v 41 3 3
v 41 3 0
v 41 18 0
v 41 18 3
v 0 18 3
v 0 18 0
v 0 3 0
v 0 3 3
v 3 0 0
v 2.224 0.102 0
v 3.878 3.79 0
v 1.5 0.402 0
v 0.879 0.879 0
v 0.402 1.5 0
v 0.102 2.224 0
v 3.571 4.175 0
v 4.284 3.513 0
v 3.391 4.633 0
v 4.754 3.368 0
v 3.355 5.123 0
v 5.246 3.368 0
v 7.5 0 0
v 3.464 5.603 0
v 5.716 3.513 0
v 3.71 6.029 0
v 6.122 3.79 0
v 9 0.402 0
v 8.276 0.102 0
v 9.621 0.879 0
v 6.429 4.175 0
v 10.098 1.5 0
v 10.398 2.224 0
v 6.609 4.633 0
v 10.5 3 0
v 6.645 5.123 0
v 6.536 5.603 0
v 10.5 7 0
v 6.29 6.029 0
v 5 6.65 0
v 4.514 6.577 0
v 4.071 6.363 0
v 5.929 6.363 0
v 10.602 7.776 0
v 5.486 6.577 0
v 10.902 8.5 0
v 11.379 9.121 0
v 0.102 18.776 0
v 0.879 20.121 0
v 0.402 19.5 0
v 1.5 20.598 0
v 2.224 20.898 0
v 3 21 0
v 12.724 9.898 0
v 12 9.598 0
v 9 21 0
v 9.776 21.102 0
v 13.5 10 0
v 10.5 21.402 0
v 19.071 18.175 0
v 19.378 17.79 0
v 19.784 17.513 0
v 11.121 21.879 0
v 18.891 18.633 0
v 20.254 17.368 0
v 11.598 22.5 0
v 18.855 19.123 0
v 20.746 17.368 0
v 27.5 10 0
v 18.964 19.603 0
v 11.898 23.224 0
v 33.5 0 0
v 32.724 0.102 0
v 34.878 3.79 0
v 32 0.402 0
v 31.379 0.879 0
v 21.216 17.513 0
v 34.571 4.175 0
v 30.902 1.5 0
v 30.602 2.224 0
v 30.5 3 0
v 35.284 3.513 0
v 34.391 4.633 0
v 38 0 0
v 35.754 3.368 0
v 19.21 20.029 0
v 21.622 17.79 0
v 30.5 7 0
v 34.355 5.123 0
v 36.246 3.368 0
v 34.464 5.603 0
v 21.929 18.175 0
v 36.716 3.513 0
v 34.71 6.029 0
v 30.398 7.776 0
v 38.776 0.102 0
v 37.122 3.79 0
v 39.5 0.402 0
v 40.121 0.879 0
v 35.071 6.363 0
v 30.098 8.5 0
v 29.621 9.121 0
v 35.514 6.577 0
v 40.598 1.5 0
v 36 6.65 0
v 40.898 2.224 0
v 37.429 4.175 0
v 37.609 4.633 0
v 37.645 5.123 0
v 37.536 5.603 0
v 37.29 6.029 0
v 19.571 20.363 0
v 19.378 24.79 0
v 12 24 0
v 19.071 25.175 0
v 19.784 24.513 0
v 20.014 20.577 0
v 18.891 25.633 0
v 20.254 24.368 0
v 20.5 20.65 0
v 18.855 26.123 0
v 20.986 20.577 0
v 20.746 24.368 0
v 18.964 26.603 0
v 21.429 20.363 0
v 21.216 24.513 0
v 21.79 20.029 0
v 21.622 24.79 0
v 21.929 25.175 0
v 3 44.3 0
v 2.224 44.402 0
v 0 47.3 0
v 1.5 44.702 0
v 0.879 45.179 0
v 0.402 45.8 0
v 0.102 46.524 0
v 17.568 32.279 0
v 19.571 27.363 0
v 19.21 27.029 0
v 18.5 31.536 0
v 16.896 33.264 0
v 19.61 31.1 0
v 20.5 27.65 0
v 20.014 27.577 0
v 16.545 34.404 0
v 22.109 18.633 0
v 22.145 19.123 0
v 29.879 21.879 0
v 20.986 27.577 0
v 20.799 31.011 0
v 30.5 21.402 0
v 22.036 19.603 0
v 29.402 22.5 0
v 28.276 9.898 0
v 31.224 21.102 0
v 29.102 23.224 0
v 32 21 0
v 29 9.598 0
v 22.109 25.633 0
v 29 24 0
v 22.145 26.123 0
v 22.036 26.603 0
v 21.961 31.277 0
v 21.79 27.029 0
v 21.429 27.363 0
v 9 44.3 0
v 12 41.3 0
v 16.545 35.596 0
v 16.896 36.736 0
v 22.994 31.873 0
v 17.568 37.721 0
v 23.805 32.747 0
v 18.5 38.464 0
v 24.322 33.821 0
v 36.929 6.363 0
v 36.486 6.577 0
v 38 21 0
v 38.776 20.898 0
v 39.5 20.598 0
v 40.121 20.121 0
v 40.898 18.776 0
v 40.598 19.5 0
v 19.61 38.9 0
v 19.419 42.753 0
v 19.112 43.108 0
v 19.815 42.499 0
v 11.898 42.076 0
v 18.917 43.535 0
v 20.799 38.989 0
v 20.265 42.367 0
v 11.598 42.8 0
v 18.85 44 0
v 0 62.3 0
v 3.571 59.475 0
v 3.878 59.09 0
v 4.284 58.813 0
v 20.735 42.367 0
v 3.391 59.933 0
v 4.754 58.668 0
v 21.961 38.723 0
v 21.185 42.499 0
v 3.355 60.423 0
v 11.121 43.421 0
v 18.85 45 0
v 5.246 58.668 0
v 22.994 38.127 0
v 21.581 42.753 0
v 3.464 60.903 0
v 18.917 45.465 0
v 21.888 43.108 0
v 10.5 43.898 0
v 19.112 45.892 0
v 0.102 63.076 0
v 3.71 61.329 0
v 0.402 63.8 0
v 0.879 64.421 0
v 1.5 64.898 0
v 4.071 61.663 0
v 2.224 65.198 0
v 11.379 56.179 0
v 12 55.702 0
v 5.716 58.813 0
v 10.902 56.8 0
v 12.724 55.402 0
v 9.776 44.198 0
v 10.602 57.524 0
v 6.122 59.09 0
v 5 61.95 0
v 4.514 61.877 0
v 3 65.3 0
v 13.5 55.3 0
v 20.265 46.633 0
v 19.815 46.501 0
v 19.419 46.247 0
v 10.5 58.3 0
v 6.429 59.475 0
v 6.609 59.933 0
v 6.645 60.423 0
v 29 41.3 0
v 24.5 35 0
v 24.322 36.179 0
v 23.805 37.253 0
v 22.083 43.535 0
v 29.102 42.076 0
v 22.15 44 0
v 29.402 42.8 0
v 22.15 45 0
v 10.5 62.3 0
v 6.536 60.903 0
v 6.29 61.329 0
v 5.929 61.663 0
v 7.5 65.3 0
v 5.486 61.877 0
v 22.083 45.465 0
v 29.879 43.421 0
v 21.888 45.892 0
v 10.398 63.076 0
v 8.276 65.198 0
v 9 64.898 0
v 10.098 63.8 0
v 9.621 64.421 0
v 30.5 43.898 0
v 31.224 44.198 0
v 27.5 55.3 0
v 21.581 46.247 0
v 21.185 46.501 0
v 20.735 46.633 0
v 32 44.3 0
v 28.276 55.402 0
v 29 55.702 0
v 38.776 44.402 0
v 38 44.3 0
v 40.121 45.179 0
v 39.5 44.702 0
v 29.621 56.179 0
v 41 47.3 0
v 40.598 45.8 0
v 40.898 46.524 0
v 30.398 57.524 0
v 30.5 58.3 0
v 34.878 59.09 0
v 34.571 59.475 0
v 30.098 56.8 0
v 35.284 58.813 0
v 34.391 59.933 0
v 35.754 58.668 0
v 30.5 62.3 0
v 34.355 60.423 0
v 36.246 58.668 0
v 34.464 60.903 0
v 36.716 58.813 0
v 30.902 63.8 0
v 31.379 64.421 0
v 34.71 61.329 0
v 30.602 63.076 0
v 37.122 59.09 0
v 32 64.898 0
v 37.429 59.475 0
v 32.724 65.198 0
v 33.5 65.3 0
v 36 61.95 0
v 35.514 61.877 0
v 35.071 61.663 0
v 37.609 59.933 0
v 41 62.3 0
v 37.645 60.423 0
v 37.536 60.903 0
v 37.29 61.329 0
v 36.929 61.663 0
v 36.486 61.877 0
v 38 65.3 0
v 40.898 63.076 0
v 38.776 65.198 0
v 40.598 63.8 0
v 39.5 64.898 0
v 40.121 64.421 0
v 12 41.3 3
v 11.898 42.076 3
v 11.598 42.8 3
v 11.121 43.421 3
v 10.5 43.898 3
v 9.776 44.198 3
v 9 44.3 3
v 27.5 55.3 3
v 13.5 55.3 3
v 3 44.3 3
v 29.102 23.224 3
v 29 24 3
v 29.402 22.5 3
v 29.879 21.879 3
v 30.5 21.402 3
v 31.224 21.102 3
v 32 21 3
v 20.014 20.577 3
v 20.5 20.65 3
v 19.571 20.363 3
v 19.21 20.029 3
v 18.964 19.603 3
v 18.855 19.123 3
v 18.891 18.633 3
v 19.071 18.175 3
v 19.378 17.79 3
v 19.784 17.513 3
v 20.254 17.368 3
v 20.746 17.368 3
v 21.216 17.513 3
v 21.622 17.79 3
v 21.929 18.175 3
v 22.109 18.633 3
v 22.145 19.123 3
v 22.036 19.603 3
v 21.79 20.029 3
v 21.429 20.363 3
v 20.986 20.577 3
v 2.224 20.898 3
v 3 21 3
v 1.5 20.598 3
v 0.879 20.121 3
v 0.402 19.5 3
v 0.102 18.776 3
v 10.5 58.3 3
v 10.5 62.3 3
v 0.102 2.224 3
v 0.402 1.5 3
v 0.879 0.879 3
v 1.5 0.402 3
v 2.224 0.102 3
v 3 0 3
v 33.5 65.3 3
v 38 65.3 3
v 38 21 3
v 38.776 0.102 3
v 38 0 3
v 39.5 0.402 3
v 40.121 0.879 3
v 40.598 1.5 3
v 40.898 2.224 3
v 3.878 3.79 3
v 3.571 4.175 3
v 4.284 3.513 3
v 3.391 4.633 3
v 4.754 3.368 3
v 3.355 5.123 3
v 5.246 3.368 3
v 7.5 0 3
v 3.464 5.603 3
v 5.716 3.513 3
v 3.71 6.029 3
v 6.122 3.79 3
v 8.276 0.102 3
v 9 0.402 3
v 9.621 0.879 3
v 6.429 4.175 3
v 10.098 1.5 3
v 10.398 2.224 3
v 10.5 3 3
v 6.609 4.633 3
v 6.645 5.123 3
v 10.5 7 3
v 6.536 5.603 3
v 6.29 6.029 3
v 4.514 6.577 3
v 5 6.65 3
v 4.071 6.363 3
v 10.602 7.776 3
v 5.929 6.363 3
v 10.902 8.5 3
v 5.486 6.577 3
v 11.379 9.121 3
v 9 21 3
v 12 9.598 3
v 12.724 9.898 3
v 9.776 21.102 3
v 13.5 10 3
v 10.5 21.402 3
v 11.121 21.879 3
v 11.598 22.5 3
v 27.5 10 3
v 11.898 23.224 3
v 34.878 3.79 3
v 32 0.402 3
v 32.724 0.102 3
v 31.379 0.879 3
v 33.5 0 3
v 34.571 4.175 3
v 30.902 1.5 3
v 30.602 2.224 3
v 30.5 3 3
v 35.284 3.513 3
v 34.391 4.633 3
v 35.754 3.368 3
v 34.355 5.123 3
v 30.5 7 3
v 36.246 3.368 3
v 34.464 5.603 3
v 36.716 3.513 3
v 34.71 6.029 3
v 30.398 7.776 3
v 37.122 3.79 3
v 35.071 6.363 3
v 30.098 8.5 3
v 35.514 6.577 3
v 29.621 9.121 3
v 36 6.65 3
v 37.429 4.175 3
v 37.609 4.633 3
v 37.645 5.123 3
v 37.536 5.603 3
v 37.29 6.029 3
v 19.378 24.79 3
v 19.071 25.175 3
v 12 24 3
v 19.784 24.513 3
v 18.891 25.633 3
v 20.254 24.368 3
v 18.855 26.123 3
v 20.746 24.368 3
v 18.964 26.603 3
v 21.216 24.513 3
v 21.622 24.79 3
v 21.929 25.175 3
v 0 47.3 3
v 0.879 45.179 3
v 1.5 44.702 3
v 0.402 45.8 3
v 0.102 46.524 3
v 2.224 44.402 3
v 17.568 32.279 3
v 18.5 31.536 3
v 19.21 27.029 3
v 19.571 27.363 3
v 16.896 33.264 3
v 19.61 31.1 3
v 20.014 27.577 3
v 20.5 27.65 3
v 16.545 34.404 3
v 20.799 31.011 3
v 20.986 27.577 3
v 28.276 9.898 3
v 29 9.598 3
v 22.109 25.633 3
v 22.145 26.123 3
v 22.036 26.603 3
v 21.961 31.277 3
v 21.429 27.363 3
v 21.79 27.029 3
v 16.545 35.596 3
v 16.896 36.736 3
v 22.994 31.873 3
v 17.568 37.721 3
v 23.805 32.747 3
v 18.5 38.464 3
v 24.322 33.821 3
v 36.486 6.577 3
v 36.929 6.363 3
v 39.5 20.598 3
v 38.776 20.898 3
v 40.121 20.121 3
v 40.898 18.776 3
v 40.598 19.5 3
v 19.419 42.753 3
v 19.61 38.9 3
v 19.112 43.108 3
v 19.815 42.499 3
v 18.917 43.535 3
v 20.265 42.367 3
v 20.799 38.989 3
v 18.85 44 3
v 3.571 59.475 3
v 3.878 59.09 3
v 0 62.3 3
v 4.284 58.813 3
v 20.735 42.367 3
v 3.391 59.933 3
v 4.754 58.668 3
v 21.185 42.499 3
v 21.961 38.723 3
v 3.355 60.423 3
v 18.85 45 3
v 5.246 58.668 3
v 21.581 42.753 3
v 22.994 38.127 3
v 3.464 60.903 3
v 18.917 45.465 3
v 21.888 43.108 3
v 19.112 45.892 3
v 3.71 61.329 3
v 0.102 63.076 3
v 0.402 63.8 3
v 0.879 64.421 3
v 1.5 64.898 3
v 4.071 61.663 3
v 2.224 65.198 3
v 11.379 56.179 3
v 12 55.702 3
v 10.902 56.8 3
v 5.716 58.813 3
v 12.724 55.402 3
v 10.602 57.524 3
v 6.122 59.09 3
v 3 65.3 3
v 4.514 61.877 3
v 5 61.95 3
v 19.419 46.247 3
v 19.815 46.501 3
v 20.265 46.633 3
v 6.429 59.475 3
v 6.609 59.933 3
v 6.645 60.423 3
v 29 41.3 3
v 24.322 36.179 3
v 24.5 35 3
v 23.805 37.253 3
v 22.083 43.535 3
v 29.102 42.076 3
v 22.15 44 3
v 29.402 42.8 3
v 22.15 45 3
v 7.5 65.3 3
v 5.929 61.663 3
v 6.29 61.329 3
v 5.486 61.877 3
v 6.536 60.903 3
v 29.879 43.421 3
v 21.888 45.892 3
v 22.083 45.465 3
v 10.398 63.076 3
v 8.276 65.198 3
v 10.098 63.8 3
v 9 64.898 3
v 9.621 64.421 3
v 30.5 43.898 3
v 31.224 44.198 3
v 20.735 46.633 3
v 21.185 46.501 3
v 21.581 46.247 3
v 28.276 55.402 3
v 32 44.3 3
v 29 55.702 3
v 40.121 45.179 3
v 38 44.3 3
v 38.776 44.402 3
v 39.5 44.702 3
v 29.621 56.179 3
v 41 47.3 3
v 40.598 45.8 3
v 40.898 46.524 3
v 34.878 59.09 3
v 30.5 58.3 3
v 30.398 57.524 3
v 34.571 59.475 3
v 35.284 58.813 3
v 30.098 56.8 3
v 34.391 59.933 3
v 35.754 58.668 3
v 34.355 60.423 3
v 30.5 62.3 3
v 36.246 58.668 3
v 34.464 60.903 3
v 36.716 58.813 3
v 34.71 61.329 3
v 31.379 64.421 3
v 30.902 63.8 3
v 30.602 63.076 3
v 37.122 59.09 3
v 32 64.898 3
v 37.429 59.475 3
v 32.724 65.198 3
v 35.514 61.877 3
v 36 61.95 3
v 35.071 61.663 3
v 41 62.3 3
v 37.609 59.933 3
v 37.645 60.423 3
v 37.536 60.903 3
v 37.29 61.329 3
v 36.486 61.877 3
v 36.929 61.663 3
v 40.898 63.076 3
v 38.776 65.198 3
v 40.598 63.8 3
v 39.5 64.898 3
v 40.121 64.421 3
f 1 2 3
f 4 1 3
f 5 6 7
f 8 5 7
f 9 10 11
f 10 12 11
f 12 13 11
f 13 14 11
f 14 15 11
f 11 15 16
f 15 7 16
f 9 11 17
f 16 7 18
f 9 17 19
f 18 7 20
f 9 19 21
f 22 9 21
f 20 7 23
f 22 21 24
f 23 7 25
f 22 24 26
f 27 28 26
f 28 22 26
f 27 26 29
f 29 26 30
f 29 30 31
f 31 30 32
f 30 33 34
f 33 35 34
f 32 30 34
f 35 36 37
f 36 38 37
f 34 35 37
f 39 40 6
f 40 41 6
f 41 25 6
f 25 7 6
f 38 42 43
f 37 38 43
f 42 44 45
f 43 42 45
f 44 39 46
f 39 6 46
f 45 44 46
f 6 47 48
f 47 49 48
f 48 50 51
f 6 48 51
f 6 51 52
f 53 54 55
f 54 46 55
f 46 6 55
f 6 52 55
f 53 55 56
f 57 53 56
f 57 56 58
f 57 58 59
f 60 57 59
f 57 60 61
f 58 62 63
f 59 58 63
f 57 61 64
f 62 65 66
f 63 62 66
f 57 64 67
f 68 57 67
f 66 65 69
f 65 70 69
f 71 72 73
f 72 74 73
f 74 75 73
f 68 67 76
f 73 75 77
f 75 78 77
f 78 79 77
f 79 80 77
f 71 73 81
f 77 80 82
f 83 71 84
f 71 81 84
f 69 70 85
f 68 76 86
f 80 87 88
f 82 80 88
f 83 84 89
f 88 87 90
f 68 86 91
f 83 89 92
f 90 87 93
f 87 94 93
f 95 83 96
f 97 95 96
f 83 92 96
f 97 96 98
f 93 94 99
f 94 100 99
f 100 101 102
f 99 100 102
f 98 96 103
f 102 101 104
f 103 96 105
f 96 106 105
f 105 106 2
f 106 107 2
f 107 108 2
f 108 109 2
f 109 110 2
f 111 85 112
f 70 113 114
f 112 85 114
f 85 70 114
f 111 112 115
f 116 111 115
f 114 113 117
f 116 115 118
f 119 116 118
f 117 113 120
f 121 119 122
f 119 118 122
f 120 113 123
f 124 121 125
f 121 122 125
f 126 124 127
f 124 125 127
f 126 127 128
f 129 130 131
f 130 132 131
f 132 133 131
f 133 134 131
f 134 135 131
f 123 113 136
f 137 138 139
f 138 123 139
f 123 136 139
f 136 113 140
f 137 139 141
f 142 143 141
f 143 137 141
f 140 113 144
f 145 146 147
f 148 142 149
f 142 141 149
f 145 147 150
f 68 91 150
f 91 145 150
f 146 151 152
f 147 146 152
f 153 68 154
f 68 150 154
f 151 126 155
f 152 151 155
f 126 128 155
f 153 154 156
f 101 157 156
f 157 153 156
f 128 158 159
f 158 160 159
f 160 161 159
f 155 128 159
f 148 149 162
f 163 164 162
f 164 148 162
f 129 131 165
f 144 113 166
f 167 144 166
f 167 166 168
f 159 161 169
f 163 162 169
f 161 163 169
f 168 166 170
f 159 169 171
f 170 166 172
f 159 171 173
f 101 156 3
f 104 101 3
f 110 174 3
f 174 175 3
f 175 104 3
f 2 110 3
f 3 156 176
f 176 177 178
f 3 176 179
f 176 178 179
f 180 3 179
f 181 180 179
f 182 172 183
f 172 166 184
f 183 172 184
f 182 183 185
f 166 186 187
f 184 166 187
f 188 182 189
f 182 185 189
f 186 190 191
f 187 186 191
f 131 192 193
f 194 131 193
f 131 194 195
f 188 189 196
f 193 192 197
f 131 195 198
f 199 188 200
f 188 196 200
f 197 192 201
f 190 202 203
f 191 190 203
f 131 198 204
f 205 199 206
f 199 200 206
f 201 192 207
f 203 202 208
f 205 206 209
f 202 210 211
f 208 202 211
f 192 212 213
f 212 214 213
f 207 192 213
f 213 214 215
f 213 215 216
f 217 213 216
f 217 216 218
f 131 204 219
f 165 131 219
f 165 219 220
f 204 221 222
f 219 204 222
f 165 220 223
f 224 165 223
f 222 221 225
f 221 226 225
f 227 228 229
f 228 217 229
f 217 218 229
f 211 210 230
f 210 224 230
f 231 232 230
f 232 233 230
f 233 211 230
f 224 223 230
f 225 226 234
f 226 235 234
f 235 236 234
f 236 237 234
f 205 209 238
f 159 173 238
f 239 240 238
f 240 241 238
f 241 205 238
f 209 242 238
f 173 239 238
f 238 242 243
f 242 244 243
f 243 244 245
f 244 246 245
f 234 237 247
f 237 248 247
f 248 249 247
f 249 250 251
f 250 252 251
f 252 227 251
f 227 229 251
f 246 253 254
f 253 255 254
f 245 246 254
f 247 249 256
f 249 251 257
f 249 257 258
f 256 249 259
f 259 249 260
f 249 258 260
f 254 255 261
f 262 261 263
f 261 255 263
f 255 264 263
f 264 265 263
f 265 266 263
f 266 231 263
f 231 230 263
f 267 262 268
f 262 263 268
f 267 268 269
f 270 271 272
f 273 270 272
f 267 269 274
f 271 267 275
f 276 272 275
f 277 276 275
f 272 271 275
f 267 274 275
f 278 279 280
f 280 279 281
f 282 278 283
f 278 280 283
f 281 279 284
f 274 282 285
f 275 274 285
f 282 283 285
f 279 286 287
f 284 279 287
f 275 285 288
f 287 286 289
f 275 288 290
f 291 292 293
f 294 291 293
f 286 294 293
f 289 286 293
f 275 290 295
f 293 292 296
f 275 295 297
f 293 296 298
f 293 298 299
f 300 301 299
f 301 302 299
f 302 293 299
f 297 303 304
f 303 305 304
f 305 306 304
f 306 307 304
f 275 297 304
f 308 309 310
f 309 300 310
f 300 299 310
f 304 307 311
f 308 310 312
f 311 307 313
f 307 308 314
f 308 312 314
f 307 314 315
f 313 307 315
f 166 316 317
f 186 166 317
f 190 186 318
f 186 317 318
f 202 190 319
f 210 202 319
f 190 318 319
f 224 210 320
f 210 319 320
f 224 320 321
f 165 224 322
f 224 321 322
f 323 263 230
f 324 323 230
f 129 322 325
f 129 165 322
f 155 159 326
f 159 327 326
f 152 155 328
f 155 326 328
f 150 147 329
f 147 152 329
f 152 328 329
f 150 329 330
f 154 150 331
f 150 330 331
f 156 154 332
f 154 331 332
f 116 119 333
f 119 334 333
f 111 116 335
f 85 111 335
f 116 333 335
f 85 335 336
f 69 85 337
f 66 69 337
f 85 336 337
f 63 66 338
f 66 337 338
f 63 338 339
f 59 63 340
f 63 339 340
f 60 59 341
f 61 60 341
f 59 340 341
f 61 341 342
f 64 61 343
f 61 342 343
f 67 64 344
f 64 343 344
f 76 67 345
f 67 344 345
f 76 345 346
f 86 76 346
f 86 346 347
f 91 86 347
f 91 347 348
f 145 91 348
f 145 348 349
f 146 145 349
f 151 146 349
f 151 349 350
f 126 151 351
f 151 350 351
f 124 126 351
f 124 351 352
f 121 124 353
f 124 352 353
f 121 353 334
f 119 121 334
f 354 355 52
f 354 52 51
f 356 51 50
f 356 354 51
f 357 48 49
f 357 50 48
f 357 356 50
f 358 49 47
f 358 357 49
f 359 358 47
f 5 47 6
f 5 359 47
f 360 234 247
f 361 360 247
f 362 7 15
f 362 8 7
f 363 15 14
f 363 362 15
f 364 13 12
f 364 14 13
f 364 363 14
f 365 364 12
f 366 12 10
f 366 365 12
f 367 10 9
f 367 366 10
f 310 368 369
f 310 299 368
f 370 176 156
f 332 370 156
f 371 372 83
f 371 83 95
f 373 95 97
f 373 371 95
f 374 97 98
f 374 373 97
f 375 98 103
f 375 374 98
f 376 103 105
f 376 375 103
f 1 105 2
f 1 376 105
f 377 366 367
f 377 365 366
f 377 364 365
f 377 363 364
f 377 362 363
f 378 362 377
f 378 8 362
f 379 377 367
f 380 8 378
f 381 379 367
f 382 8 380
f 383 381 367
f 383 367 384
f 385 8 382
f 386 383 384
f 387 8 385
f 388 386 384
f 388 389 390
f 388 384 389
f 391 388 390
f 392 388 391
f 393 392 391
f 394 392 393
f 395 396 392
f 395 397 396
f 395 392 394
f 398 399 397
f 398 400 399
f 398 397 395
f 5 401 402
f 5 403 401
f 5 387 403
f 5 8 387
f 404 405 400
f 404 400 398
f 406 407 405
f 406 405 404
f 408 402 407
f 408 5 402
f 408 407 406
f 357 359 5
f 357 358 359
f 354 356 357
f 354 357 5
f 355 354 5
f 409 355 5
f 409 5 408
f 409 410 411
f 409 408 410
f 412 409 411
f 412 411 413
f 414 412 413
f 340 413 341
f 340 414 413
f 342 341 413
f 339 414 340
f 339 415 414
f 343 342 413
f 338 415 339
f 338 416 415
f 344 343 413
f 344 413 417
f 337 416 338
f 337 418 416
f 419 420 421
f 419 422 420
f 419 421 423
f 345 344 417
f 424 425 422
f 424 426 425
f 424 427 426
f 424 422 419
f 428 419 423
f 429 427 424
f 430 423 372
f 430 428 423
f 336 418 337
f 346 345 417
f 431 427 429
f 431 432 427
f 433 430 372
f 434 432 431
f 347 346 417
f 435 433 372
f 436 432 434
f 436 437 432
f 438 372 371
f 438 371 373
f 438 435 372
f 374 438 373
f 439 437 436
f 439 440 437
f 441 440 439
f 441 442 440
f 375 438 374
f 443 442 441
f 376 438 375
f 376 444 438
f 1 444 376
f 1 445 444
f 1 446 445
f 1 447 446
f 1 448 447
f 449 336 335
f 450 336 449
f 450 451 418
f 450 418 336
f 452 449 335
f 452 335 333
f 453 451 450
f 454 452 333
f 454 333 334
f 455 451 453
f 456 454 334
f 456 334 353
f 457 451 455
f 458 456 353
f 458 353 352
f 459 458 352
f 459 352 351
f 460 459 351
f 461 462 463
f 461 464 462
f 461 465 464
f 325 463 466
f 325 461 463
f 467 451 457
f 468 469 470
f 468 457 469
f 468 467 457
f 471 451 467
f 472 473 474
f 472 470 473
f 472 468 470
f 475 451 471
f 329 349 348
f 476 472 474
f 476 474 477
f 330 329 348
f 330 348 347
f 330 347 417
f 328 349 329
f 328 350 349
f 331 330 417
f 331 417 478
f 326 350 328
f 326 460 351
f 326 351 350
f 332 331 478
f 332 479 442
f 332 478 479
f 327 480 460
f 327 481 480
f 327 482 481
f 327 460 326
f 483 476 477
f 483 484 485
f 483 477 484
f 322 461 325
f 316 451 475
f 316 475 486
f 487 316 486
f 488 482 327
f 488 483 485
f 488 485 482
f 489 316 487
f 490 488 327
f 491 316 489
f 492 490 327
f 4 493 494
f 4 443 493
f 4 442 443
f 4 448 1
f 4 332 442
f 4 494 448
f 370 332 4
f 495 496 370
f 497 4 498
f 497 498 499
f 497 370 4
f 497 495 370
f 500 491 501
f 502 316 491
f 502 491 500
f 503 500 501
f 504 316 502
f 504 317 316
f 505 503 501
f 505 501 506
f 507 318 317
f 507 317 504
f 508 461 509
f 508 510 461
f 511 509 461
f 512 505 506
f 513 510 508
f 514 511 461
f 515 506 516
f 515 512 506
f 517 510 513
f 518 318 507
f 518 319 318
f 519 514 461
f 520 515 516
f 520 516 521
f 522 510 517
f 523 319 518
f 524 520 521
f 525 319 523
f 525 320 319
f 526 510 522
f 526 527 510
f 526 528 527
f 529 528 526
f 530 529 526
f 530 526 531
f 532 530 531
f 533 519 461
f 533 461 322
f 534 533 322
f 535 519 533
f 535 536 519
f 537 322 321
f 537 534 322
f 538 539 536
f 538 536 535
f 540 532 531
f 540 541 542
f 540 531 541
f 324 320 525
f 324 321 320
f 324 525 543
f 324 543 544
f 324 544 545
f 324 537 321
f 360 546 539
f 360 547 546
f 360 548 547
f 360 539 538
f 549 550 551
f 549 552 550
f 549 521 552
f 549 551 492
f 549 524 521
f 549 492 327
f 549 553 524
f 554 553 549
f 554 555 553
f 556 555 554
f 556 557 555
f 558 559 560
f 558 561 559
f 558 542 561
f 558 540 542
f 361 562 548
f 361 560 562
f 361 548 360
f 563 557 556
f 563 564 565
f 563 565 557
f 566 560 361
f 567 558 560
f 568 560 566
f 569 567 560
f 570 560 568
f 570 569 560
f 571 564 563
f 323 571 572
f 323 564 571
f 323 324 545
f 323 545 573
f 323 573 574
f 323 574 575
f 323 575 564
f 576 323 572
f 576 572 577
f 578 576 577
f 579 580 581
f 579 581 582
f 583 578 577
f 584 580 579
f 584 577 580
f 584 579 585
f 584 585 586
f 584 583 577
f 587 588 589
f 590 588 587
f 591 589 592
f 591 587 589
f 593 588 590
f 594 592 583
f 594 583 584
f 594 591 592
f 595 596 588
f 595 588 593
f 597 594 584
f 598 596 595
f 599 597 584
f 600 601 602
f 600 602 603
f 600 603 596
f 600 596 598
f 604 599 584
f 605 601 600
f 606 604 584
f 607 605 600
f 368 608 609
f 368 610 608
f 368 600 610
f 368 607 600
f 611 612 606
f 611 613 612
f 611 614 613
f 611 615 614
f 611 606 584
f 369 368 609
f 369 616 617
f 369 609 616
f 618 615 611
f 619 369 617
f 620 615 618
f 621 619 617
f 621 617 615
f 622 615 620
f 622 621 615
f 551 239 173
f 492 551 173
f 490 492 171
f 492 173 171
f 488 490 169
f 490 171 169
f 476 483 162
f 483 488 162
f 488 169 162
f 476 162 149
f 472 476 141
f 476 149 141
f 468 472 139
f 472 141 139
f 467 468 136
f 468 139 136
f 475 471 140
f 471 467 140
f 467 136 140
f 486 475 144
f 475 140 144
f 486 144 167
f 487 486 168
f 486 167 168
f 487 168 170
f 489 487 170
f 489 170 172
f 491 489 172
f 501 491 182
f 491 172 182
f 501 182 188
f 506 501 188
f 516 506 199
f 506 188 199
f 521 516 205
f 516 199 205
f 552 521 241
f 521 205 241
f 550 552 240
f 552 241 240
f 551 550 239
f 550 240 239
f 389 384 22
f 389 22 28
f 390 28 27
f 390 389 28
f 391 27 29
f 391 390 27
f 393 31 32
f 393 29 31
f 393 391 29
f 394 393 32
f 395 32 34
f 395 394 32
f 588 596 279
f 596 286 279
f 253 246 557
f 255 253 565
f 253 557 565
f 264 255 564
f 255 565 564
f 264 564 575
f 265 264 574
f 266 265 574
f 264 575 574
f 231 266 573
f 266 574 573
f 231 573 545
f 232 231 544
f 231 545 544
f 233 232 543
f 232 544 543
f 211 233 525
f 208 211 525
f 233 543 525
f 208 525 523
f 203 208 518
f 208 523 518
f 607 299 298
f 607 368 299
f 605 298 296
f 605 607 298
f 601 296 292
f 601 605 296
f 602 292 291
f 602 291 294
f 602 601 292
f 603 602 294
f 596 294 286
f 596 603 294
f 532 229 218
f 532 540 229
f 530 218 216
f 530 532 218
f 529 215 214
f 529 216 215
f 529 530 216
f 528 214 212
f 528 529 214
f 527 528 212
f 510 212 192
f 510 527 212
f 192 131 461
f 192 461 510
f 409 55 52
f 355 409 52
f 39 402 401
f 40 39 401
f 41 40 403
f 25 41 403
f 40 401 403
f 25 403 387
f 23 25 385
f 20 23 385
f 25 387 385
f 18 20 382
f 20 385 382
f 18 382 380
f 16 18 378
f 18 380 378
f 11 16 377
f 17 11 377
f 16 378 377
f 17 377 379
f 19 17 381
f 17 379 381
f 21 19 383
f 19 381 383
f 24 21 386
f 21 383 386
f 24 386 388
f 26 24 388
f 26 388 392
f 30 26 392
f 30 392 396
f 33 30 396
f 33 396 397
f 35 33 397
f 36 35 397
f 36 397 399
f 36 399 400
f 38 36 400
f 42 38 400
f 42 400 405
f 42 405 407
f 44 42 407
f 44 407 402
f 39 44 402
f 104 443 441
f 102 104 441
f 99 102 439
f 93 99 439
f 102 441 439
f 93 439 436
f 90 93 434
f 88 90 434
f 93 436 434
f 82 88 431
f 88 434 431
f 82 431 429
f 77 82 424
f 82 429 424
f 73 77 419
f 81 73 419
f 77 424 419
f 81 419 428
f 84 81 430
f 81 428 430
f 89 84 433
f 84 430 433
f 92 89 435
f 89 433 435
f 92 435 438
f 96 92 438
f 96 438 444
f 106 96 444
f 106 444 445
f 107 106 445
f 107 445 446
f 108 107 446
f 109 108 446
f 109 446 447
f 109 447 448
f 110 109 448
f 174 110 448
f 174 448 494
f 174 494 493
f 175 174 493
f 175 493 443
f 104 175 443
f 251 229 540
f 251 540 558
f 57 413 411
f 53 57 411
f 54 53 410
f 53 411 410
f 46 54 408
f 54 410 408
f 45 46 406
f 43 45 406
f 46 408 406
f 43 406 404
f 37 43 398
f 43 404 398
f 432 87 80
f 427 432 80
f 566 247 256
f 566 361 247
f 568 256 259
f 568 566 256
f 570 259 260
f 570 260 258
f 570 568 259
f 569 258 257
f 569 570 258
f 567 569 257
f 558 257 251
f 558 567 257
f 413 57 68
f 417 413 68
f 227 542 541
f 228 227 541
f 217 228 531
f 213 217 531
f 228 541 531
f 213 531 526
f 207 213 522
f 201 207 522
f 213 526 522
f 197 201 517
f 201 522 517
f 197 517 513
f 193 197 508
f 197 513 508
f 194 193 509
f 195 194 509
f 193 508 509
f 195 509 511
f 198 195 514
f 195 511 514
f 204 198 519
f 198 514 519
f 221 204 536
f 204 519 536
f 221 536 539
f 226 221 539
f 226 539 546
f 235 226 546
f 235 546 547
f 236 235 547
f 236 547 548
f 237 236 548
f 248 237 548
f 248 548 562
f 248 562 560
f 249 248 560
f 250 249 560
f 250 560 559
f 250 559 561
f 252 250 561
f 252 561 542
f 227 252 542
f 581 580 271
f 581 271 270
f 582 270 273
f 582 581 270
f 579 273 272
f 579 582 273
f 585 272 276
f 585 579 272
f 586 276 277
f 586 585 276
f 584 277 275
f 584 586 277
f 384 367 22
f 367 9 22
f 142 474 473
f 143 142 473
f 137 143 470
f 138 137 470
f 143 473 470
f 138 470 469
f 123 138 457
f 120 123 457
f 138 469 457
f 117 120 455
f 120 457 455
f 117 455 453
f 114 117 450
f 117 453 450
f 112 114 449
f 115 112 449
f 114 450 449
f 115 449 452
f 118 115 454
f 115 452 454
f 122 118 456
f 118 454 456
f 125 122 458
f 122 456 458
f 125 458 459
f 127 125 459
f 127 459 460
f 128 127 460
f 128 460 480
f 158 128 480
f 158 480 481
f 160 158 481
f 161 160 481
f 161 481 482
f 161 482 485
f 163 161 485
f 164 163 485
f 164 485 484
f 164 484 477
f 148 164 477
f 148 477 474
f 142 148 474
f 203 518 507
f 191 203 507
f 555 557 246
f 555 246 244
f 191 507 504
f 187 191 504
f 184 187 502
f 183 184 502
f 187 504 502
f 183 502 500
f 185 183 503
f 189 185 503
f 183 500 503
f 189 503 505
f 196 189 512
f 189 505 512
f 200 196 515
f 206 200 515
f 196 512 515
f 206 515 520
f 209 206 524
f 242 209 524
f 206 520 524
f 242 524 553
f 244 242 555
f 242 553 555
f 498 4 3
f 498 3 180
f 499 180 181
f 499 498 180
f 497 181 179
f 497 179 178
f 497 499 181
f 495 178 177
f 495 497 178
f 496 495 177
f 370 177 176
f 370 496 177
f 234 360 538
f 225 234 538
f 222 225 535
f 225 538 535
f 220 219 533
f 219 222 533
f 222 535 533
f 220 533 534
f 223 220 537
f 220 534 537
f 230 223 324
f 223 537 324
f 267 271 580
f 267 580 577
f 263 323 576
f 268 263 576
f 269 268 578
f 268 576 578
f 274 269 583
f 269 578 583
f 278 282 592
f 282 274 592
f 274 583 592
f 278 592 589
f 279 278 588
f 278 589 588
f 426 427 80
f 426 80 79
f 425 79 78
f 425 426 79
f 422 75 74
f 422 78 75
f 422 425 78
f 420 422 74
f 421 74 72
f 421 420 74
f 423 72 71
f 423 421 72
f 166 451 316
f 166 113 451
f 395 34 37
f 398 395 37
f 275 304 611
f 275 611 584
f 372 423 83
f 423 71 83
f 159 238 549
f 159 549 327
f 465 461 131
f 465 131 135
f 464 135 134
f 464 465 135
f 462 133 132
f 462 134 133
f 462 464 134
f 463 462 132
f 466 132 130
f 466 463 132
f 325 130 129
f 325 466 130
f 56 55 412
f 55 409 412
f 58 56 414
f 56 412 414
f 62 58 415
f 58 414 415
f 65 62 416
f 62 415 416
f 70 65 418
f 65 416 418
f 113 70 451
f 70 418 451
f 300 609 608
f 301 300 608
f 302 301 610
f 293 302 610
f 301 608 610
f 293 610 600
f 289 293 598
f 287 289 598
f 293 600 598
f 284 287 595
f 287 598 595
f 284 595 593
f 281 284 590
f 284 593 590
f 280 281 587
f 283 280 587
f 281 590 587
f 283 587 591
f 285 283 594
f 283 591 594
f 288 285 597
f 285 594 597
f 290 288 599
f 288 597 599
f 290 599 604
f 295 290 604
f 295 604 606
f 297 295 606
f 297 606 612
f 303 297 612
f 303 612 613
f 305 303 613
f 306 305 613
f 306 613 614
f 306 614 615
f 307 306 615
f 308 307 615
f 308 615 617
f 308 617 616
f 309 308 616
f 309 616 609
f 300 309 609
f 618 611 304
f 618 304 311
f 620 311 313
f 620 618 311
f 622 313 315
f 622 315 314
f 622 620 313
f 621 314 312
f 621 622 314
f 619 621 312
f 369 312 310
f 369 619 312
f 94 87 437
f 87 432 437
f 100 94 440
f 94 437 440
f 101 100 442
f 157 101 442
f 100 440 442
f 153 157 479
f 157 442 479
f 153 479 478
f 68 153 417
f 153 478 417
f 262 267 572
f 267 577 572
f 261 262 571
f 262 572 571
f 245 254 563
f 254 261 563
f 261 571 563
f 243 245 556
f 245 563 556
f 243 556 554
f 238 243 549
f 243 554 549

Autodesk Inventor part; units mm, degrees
ref_plane "YZ Plane" through (0, 0, 0) normal (1, 0, 0) x (0, 1, 0)
ref_plane "XZ Plane" through (0, 0, 0) normal (0, 1, 0) x (-1, 0, 0)
ref_plane "XY Plane" through (0, 0, 0) normal (0, 0, 1) x (1, 0, 0)
sketch "Sketch1" plane through (0, 0, 0) normal (0, 0, 1) x (1, 0, 0)
  line L0 (41, 0) -> (41, 65.3) construction
  line L1 (0, 65.3) -> (0, 0) construction
  line L2 (41, 0) -> (41, 21)
  line L3 (0, 21) -> (0, 0)
  line L4 (41, 65.3) -> (41, 44.3)
  line L5 (0, 44.3) -> (0, 65.3)
  line L6 (29, 44.3) -> (29, 21)
  line L7 (12, 21) -> (12, 44.3)
  line L8 (41, 44.3) -> (29, 44.3)
  line L9 (12, 44.3) -> (0, 44.3)
  line L10 (41, 21) -> (29, 21)
  line L11 (12, 21) -> (0, 21)
  line L12 (30.5, 65.3) -> (30.5, 55.3)
  line L13 (30.5, 55.3) -> (10.5, 55.3)
  line L14 (10.5, 55.3) -> (10.5, 65.3)
  line L15 (41, 65.3) -> (30.5, 65.3) construction
  line L16 (10.5, 65.3) -> (0, 65.3) construction
  line L17 (0, 65.3) -> (10.5, 65.3)
  line L18 (30.5, 65.3) -> (41, 65.3)
  line L19 (10.5, 0) -> (10.5, 10)
  line L20 (10.5, 10) -> (30.5, 10)
  line L21 (30.5, 10) -> (30.5, 0)
  line L22 (0, 0) -> (10.5, 0) construction
  line L23 (30.5, 0) -> (41, 0) construction
  line L24 (0, 0) -> (10.5, 0)
  line L25 (30.5, 0) -> (41, 0)
  circle A0 centre (20.5, 35) radius 4
  point P0 (5, 60.3)
  point P1 (36, 60.3)
  point P2 (5, 5)
  point P3 (36, 5)
  point P4 (20.5, 44)
  point P5 (20.5, 26)
  point P6 (20.5, 19)
  point P7 (20.5, 45)
  dimension "d0" = 41
  dimension "d1" = 65.3
  dimension "d2" = 21
  dimension "d3" = 21
  dimension "d4" = 12
  dimension "d5" = 9
  dimension "d6" = 9
  dimension "d7" = 7
  dimension "d8" = 1
  dimension "d9" = 5
  dimension "d11" = 5
  dimension "d12" = 41
  dimension "d13" = 41
  dimension "d14" = 12
  dimension "d15" = 10.5
  dimension "d16" = 10.5
  dimension "d17" = 8
  dimension "d18" = 20.5
  dimension "d19" = 5
  dimension "d20" = 5
extrude "Extrusion1" add sketch "Sketch1" along normal blind 3
sketch "Sketch2" plane through (0, 0, 0) normal (0, 0, 1) x (1, 0, 0)
  line L0 (41, 0) -> (41, 65.3) construction
  line L1 (0, 65.3) -> (0, 0) construction
  line L2 (41, 0) -> (41, 21)
  line L3 (0, 21) -> (0, 0)
  line L4 (41, 65.3) -> (41, 44.3)
  line L5 (0, 44.3) -> (0, 65.3)
  line L6 (29, 44.3) -> (29, 21)
  line L7 (12, 21) -> (12, 44.3)
  line L8 (41, 44.3) -> (29, 44.3)
  line L9 (12, 44.3) -> (0, 44.3)
  line L10 (41, 21) -> (29, 21)
  line L11 (12, 21) -> (0, 21)
  line L12 (30.5, 65.3) -> (30.5, 55.3)
  line L13 (30.5, 55.3) -> (10.5, 55.3)
  line L14 (10.5, 55.3) -> (10.5, 65.3)
  line L15 (41, 65.3) -> (30.5, 65.3) construction
  line L16 (10.5, 65.3) -> (0, 65.3) construction
  line L17 (0, 65.3) -> (10.5, 65.3)
  line L18 (30.5, 65.3) -> (41, 65.3)
  line L19 (10.5, 0) -> (10.5, 10)
  line L20 (10.5, 10) -> (30.5, 10)
  line L21 (30.5, 10) -> (30.5, 0)
  line L22 (0, 0) -> (10.5, 0) construction
  line L23 (30.5, 0) -> (41, 0) construction
  line L24 (0, 0) -> (10.5, 0)
  line L25 (30.5, 0) -> (41, 0)
  circle A0 centre (20.5, 35) radius 4
  point P0 (5, 60.3)
  point P1 (36, 60.3)
  point P2 (5, 5)
  point P3 (36, 5)
  point P4 (20.5, 44)
  point P5 (20.5, 26)
  point P6 (20.5, 19)
  point P7 (20.5, 45)
  dimension "d21" = 41
  dimension "d22" = 65.3
  dimension "d23" = 21
  dimension "d24" = 21
  dimension "d25" = 12
  dimension "d28" = 7
  dimension "d29" = 1
  dimension "d30" = 5
  dimension "d31" = 5
  dimension "d32" = 41
  dimension "d33" = 41
  dimension "d34" = 12
  dimension "d35" = 10.5
  dimension "d36" = 10.5
  dimension "d37" = 8
  dimension "d38" = 20.5
  dimension "d39" = 5
  dimension "d40" = 5
hole "Hole1" at (5, 60.3, 0) at (36, 60.3, 0) at (5, 5, 0) at (36, 5, 0) at (20.5, 44, 0) at (20.5, 26, 0) at (20.5, 19, 0) at (20.5, 45, 0) direction (0, 0, 1) diameter 3.3 end through all
fillet "Fillet1" radius 3 20 edges at (10.5, 65.3, 1.5) (0, 65.3, 1.5) (0, 44.3, 1.5) (12, 44.3, 1.5) (12, 21, 1.5) (0, 21, 1.5) (0, 0, 1.5) (10.5, 0, 1.5) (10.5, 10, 1.5) (30.5, 10, 1.5) (30.5, 0, 1.5) (41, 0, 1.5) (41, 21, 1.5) (29, 21, 1.5) (29, 44.3, 1.5) (41, 44.3, 1.5) (41, 65.3, 1.5) (30.5, 65.3, 1.5) (30.5, 55.3, 1.5) (10.5, 55.3, 1.5)
sketch "Sketch3" plane through (0, 0, 3) normal (0, 0, 1) x (1, 0, 0)
  line L0 (22.15, 45) -> (22.15, 44)
  arc A0 (18.9276, 44.5) -> (22.0724, 44.5) centre (20.5, 44) ccw projected
  arc A1 (22.0724, 44.5) -> (18.9276, 44.5) centre (20.5, 45) ccw projected
  line L1 (18.85, 45) -> (18.85, 44)
  point P0 (0, 0)
extrude "Extrusion2" cut sketch "Sketch3" against normal blind 3 contours L0 A0 A1 | A1 A0 L1
sketch "Sketch4" plane through (0, 0, 3) normal (0, 0, 1) x (1, 0, 0)
  circle A0 centre (20.5, 35) radius 4 projected
  circle A1 centre (20.5, 26) radius 1.65 projected
  circle A2 centre (36, 5) radius 1.65 projected
  circle A3 centre (36, 60.3) radius 1.65 projected
  circle A4 centre (5, 60.3) radius 1.65 projected
  circle A5 centre (5, 5) radius 1.65 projected
  line L0 (22.15, 45) -> (22.15, 44) projected
  arc A6 (18.85, 44) -> (22.15, 44) centre (20.5, 44) ccw projected
  line L1 (18.85, 44) -> (18.85, 45) projected
  arc A7 (22.15, 45) -> (18.85, 45) centre (20.5, 45) ccw projected
  circle A8 centre (20.5, 19) radius 1.65 projected
  arc A9 (33.5, 65.3) -> (30.5, 62.3) centre (33.5, 62.3) ccw projected
  line L2 (30.5, 62.3) -> (30.5, 58.3) projected
  arc A10 (27.5, 55.3) -> (30.5, 58.3) centre (27.5, 58.3) ccw projected
  line L3 (27.5, 55.3) -> (13.5, 55.3) projected
  arc A11 (10.5, 58.3) -> (13.5, 55.3) centre (13.5, 58.3) ccw projected
  line L4 (10.5, 58.3) -> (10.5, 62.3) projected
  arc A12 (10.5, 62.3) -> (7.5, 65.3) centre (7.5, 62.3) ccw projected
  line L5 (7.5, 65.3) -> (3, 65.3) projected
  arc A13 (3, 65.3) -> (0, 62.3) centre (3, 62.3) ccw projected
  line L6 (0, 62.3) -> (0, 47.3) projected
  arc A14 (0, 47.3) -> (3, 44.3) centre (3, 47.3) ccw projected
  line L7 (3, 44.3) -> (9, 44.3) projected
  arc A15 (12, 41.3) -> (9, 44.3) centre (9, 41.3) ccw projected
  line L8 (12, 41.3) -> (12, 24) projected
  arc A16 (9, 21) -> (12, 24) centre (9, 24) ccw projected
  line L9 (9, 21) -> (3, 21) projected
  arc A17 (3, 21) -> (0, 18) centre (3, 18) ccw projected
  line L10 (0, 18) -> (0, 3) projected
  arc A18 (0, 3) -> (3, 0) centre (3, 3) ccw projected
  line L11 (3, 0) -> (7.5, 0) projected
  arc A19 (7.5, 0) -> (10.5, 3) centre (7.5, 3) ccw projected
  line L12 (10.5, 3) -> (10.5, 7) projected
  arc A20 (13.5, 10) -> (10.5, 7) centre (13.5, 7) ccw projected
  line L13 (13.5, 10) -> (27.5, 10) projected
  arc A21 (30.5, 7) -> (27.5, 10) centre (27.5, 7) ccw projected
  line L14 (30.5, 7) -> (30.5, 3) projected
  arc A22 (30.5, 3) -> (33.5, 0) centre (33.5, 3) ccw projected
  line L15 (33.5, 0) -> (38, 0) projected
  arc A23 (38, 0) -> (41, 3) centre (38, 3) ccw projected
  line L16 (41, 3) -> (41, 18) projected
  arc A24 (41, 18) -> (38, 21) centre (38, 18) ccw projected
  line L17 (38, 21) -> (32, 21) projected
  arc A25 (29, 24) -> (32, 21) centre (32, 24) ccw projected
  line L18 (29, 24) -> (29, 41.3) projected
  arc A26 (32, 44.3) -> (29, 41.3) centre (32, 41.3) ccw projected
  line L19 (32, 44.3) -> (38, 44.3) projected
  arc A27 (38, 44.3) -> (41, 47.3) centre (38, 47.3) ccw projected
  line L20 (41, 47.3) -> (41, 62.3) projected
  arc A28 (41, 62.3) -> (38, 65.3) centre (38, 62.3) ccw projected
  line L21 (38, 65.3) -> (33.5, 65.3) projected
  point P0 (0, 0)
properties part number "TapaInferior"
